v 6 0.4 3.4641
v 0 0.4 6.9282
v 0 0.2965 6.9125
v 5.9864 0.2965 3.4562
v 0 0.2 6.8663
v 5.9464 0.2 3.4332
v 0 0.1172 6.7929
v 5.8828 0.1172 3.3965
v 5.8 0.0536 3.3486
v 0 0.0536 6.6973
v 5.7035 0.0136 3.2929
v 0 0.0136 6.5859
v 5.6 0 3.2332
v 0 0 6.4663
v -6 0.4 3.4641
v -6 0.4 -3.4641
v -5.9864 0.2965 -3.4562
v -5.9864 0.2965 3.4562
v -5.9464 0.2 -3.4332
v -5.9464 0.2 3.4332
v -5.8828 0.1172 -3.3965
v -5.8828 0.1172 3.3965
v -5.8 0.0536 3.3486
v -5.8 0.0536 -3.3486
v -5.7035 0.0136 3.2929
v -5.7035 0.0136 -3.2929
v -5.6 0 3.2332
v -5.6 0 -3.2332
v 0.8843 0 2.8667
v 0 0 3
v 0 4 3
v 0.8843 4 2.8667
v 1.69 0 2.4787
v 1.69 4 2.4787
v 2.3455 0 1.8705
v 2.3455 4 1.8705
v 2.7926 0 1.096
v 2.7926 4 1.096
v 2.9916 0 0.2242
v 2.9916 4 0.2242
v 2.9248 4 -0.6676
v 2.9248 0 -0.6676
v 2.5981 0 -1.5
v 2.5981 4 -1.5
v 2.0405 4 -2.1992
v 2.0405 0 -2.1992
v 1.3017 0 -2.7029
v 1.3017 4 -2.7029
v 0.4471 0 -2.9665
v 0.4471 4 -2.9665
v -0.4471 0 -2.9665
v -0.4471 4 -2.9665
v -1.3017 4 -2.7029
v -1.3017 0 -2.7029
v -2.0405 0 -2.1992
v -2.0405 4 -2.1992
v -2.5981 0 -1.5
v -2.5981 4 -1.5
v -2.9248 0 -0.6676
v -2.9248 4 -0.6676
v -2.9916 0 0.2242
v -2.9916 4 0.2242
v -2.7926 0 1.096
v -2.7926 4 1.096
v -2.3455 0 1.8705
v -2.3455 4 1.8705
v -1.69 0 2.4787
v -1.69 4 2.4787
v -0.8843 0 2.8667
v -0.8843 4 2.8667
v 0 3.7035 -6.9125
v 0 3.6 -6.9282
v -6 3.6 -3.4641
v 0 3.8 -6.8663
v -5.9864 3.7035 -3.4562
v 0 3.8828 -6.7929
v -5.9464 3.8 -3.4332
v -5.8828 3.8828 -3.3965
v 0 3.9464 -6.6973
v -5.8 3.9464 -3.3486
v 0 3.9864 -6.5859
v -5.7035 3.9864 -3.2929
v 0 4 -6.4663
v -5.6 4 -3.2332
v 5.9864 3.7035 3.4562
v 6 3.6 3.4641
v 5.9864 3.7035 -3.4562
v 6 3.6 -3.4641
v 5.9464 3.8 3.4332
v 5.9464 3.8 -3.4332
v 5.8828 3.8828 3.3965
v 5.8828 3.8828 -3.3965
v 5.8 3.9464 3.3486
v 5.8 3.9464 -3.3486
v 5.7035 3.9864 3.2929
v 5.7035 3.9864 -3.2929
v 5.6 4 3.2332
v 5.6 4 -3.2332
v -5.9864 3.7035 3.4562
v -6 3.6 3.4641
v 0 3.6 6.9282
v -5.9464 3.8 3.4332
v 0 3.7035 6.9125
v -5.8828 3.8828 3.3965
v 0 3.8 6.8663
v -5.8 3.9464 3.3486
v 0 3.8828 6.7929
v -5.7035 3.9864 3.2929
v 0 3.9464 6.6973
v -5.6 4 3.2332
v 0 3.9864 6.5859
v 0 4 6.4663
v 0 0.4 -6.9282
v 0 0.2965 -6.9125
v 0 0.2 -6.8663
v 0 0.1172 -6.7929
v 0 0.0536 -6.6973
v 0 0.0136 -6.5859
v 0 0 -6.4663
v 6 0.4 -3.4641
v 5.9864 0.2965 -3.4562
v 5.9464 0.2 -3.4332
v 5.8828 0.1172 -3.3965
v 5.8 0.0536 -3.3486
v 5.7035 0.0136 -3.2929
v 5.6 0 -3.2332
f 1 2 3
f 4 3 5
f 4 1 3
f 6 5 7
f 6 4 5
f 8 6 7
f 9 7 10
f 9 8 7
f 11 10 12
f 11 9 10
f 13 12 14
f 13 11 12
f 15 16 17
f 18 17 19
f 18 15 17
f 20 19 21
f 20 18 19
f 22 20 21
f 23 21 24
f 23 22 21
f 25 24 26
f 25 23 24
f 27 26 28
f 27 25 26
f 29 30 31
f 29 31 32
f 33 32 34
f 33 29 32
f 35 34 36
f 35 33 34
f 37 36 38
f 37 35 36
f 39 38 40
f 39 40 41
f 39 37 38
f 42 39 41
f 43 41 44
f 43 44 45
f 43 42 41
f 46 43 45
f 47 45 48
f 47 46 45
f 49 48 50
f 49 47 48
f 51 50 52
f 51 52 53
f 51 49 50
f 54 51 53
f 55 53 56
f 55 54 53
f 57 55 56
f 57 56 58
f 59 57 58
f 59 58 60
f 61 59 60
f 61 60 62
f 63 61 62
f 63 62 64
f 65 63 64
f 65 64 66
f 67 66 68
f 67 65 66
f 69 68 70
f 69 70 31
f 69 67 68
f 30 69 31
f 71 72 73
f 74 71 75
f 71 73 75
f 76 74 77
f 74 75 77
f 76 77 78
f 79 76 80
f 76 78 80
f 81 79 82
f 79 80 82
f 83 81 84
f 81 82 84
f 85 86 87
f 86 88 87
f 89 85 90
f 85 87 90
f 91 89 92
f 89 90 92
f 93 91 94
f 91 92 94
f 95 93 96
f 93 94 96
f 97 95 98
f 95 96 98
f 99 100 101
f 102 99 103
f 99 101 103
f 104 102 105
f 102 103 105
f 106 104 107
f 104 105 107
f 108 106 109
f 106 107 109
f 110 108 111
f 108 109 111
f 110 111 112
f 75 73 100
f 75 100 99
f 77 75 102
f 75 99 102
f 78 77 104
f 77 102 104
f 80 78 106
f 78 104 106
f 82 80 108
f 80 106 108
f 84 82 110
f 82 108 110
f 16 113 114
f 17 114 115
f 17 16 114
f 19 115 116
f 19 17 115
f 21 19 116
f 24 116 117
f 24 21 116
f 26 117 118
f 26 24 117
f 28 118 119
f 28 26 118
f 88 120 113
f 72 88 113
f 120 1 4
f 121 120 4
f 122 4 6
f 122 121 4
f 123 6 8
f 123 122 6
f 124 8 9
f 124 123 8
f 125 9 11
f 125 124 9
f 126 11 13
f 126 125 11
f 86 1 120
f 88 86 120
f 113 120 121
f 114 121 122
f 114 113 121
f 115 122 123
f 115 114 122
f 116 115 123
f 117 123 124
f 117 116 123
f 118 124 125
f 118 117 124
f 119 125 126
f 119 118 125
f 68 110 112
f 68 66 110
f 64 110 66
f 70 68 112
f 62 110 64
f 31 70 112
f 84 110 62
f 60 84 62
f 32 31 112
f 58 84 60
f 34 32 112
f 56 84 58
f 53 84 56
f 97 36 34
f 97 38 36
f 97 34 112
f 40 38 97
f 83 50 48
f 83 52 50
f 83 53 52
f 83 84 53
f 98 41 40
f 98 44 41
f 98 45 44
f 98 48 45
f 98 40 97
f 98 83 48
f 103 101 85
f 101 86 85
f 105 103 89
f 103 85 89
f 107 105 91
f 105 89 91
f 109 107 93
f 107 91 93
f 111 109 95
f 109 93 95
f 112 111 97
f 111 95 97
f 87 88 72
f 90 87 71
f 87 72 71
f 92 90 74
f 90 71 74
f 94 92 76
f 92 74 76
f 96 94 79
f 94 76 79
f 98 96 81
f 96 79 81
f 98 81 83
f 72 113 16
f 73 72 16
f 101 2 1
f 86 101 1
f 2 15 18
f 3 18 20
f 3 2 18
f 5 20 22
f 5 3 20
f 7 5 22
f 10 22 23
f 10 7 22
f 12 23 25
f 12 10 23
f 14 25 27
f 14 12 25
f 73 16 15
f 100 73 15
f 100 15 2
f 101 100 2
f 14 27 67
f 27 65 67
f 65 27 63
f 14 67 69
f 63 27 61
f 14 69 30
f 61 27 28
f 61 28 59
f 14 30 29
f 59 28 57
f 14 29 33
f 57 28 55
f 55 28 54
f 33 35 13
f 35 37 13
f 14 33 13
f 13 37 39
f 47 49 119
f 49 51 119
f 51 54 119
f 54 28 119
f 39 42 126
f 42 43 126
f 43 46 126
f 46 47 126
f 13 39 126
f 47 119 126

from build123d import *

# Parameters (mm, degrees)
SKETCH1_R           = 3
BOSS_EXTRUDE1_DEPTH = 4
FILLET1_R           = 0.4


with BuildPart() as part:
    # Sketch1 → Boss-Extrude1 (new body)
    with BuildSketch(Plane(origin=(0, 0, 0), x_dir=(1, 0, 0), z_dir=(0, 1, 0))):
        Polygon((0, 6.92820323), (-6, 3.464101615), (-6, -3.464101615), (0, -6.92820323), (6, -3.464101615), (6, 3.464101615), align=None)
        with Locations(Location((0, 0, 0), (0, 0, 270))):
            Circle(SKETCH1_R, mode=Mode.SUBTRACT)
    extrude(amount=BOSS_EXTRUDE1_DEPTH)

    # Fillet1
    fillet1_edges = [part.edges().sort_by_distance(p)[0] for p in [
        (-6, 4, 0),
        (-3, 4, 5.196152423),
        (3, 4, 5.196152423),
        (6, 4, 0),
        (3, 4, -5.196152423),
        (6, 0, 0),
        (3, 0, 5.196152423),
        (-3, 0, 5.196152423),
        (-6, 0, 0),
        (-3, 0, -5.196152423),
        (3, 0, -5.196152423),
        (-3, 4, -5.196152423),
    ]]
    fillet(fillet1_edges, radius=FILLET1_R)


solid = part.part
